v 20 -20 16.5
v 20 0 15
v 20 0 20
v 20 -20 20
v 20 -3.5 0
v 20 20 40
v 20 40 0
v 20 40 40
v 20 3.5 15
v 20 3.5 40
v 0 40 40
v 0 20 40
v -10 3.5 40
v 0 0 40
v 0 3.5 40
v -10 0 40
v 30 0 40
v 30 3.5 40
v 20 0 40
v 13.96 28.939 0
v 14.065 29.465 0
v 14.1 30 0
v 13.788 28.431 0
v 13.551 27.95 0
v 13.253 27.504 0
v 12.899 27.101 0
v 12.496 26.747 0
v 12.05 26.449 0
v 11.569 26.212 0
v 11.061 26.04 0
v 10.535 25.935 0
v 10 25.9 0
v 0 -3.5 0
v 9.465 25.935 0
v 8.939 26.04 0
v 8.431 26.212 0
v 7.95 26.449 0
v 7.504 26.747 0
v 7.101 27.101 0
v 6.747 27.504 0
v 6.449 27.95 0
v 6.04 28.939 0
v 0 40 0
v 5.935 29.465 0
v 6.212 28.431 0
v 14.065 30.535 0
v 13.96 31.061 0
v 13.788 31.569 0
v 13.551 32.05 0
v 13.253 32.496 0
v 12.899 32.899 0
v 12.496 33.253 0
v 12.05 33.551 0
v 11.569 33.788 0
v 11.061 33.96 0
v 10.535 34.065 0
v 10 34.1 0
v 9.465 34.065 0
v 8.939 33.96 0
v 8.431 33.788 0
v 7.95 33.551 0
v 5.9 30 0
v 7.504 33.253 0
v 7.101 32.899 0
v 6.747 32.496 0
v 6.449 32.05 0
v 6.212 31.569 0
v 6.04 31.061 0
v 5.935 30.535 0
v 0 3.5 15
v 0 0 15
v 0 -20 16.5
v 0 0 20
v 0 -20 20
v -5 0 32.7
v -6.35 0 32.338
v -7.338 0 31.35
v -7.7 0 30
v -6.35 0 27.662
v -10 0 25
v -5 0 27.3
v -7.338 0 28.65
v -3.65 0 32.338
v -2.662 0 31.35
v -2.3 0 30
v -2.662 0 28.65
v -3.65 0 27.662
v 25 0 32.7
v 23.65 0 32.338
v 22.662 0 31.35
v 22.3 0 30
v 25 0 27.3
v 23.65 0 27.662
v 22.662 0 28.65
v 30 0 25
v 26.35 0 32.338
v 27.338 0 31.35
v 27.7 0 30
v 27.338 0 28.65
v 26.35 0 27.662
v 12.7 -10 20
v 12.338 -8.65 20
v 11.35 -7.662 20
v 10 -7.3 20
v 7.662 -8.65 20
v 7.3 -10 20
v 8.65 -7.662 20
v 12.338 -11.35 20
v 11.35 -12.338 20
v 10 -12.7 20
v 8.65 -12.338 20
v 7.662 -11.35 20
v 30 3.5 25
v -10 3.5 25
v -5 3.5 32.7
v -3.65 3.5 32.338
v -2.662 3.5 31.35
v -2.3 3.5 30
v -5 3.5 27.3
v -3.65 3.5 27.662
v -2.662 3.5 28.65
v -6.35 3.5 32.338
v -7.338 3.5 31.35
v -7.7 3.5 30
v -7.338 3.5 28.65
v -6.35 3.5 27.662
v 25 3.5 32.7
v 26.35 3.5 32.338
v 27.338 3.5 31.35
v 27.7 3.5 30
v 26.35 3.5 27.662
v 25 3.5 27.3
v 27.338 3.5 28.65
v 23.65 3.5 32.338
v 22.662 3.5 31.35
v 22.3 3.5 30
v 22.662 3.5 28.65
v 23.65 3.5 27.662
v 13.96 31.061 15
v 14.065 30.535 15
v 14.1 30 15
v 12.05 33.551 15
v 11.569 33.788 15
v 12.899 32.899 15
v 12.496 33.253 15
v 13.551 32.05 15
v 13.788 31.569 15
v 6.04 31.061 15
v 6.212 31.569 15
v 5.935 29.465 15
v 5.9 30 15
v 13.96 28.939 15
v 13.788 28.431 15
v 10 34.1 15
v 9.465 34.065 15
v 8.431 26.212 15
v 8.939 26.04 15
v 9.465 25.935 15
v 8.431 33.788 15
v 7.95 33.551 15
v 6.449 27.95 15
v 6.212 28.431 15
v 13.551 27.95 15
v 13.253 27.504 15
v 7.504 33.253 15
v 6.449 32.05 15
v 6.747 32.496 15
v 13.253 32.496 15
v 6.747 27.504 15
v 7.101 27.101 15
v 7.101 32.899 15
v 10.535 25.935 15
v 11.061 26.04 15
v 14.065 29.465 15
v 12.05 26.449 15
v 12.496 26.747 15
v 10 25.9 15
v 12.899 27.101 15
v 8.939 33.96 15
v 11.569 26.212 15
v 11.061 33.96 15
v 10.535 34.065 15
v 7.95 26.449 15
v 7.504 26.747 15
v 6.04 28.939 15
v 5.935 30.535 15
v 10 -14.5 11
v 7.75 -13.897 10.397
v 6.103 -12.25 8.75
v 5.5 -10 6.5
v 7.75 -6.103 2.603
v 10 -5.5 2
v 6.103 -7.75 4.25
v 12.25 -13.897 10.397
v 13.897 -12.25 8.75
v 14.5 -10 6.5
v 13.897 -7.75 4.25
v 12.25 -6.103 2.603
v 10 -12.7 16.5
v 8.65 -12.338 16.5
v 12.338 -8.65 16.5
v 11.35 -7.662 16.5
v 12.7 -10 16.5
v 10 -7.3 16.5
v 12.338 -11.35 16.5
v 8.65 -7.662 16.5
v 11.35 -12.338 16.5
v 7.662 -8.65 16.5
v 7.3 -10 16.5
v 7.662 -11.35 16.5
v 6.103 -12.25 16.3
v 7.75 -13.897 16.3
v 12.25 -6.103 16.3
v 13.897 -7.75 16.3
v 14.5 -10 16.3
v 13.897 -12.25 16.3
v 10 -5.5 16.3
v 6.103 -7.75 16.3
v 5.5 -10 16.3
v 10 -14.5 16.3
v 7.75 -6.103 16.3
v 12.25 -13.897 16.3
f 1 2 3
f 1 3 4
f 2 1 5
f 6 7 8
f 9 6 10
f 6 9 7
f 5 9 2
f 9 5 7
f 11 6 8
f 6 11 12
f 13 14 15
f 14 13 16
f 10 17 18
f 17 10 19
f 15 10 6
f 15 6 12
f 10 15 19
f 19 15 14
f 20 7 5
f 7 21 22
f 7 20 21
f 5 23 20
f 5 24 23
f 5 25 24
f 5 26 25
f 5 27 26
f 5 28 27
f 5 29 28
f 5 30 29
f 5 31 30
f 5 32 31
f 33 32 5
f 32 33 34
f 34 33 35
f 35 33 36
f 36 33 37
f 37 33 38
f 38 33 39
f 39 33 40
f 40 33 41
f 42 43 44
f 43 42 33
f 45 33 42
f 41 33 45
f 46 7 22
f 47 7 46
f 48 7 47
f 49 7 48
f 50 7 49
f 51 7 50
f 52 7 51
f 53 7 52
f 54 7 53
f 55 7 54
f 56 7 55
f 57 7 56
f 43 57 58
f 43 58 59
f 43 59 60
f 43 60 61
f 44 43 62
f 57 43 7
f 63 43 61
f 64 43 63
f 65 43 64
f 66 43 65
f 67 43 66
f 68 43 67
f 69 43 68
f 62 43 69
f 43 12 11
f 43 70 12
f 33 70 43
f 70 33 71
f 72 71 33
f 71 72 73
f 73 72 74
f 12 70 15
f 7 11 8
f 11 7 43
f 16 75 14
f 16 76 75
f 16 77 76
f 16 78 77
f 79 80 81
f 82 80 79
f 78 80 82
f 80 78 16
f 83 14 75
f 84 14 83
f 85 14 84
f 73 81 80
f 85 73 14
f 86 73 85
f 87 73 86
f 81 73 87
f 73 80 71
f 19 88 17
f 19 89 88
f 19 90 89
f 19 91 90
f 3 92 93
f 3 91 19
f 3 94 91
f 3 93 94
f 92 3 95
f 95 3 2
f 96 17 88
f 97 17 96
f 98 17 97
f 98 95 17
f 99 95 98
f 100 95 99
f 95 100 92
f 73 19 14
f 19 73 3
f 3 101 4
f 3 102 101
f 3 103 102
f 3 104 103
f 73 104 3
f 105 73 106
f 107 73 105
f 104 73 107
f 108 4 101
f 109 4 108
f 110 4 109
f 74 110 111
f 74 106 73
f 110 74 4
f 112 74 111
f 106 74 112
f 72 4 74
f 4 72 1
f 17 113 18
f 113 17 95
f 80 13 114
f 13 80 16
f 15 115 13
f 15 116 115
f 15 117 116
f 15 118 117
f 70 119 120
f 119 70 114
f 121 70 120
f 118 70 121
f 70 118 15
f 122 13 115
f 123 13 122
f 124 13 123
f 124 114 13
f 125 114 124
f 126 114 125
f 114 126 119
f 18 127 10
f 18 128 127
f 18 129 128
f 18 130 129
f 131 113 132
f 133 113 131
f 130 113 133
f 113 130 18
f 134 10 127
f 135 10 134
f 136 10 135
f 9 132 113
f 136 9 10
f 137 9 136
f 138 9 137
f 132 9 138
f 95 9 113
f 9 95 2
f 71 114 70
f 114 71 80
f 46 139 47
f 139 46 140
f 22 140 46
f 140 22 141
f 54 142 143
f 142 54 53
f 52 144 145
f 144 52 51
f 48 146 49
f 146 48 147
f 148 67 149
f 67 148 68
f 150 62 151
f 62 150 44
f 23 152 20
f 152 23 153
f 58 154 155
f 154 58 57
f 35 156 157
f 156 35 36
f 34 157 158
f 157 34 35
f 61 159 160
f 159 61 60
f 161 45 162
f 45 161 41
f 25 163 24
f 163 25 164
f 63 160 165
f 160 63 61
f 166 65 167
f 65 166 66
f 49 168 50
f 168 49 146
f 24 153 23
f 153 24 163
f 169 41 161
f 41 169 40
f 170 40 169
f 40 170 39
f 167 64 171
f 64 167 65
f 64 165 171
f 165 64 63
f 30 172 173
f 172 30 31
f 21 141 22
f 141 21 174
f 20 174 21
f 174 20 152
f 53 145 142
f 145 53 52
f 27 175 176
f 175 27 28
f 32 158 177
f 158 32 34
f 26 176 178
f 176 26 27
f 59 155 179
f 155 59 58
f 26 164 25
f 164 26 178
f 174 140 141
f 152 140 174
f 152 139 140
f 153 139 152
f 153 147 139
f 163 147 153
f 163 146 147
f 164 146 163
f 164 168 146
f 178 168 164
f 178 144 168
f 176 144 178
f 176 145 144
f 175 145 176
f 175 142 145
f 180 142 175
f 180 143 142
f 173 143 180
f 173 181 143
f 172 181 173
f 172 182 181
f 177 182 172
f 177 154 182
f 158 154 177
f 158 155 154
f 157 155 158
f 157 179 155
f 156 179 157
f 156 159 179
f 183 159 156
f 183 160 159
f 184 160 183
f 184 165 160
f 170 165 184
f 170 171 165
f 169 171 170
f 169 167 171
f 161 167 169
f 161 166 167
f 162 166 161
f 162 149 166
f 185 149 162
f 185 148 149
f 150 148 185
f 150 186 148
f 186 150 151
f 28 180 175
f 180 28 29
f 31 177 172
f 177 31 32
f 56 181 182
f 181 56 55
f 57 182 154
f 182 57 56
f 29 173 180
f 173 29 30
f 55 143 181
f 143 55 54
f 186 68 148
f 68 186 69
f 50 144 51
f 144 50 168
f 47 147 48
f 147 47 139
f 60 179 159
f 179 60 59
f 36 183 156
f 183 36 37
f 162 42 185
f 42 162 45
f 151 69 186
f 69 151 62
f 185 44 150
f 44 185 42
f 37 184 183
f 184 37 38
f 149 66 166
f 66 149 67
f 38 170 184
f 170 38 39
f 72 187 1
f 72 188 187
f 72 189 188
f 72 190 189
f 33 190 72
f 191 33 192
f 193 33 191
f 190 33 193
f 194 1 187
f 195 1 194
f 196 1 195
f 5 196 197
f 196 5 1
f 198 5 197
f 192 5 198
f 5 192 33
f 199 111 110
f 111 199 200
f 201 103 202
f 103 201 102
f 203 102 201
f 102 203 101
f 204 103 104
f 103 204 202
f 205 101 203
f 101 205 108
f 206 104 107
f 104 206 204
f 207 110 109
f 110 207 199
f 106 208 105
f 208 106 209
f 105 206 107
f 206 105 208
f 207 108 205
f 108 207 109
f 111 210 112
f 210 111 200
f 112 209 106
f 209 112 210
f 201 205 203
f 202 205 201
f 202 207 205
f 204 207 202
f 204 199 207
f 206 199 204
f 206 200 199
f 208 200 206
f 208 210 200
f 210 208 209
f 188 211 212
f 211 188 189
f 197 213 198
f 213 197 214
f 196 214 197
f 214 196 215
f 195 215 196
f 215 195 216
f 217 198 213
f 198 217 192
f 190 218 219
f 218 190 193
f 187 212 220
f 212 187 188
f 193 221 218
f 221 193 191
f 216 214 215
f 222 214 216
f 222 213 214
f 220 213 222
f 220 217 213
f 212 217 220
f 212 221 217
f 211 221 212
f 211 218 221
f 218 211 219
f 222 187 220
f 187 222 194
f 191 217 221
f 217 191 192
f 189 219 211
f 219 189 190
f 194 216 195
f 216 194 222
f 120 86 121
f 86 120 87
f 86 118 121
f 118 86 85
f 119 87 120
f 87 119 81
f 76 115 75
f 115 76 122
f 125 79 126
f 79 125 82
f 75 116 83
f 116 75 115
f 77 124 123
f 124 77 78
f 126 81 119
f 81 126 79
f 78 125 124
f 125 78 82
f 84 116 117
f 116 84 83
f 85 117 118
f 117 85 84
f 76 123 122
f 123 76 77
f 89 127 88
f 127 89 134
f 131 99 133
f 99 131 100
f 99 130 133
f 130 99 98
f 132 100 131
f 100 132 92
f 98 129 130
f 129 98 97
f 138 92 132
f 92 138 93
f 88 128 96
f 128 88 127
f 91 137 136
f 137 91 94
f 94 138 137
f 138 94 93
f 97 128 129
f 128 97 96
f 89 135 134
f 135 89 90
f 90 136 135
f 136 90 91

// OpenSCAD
t=3.5;

difference()
{
    union()
    {
        cube([20,40,40]);
        
        translate([0,-20,0])
            cube([20,20,20]);
        
        translate([-10,0,25])
            cube([40,t,15]);
        
        translate([-10,0,25])
            rotate([0,45,0])
                cube([40/sqrt(2),t,40/sqrt(2)]);
        
        //rotate([45,0,0])
           // cube([20,20*sqrt(2),20*sqrt(2)]);
    }
    union()
    {
        translate([0,-20,20])
            cube([20,20,20]);
        
        translate([0,0,40])
            cube([20,20,20]);
        
        translate([10,10+20,0])
            cylinder(d=8.2,h=15,$fn=48);
        
        /*translate([0,20,20+t])
            rotate([45,0,0])
                cube([20,20*sqrt(2),20*sqrt(2)]);*/
        
        translate([0,-20,-20-t])
            rotate([45,0,0])
                cube([20,20*sqrt(2),20*sqrt(2)]);
        
        translate([10,-10,20-t])
            cylinder(d=5.4,h=t,$fn=12);
        translate([10,-10,0])
            cylinder(d=9,h=20-t-0.2,$fn=12);
        
        translate([-5,0,30])
            rotate([270,0,0])
                cylinder(d=5.4,h=t+1,$fn=12);
        translate([20+5,0,30])
            rotate([270,0,0])
                cylinder(d=5.4,h=t+1,$fn=12);
    }
}
